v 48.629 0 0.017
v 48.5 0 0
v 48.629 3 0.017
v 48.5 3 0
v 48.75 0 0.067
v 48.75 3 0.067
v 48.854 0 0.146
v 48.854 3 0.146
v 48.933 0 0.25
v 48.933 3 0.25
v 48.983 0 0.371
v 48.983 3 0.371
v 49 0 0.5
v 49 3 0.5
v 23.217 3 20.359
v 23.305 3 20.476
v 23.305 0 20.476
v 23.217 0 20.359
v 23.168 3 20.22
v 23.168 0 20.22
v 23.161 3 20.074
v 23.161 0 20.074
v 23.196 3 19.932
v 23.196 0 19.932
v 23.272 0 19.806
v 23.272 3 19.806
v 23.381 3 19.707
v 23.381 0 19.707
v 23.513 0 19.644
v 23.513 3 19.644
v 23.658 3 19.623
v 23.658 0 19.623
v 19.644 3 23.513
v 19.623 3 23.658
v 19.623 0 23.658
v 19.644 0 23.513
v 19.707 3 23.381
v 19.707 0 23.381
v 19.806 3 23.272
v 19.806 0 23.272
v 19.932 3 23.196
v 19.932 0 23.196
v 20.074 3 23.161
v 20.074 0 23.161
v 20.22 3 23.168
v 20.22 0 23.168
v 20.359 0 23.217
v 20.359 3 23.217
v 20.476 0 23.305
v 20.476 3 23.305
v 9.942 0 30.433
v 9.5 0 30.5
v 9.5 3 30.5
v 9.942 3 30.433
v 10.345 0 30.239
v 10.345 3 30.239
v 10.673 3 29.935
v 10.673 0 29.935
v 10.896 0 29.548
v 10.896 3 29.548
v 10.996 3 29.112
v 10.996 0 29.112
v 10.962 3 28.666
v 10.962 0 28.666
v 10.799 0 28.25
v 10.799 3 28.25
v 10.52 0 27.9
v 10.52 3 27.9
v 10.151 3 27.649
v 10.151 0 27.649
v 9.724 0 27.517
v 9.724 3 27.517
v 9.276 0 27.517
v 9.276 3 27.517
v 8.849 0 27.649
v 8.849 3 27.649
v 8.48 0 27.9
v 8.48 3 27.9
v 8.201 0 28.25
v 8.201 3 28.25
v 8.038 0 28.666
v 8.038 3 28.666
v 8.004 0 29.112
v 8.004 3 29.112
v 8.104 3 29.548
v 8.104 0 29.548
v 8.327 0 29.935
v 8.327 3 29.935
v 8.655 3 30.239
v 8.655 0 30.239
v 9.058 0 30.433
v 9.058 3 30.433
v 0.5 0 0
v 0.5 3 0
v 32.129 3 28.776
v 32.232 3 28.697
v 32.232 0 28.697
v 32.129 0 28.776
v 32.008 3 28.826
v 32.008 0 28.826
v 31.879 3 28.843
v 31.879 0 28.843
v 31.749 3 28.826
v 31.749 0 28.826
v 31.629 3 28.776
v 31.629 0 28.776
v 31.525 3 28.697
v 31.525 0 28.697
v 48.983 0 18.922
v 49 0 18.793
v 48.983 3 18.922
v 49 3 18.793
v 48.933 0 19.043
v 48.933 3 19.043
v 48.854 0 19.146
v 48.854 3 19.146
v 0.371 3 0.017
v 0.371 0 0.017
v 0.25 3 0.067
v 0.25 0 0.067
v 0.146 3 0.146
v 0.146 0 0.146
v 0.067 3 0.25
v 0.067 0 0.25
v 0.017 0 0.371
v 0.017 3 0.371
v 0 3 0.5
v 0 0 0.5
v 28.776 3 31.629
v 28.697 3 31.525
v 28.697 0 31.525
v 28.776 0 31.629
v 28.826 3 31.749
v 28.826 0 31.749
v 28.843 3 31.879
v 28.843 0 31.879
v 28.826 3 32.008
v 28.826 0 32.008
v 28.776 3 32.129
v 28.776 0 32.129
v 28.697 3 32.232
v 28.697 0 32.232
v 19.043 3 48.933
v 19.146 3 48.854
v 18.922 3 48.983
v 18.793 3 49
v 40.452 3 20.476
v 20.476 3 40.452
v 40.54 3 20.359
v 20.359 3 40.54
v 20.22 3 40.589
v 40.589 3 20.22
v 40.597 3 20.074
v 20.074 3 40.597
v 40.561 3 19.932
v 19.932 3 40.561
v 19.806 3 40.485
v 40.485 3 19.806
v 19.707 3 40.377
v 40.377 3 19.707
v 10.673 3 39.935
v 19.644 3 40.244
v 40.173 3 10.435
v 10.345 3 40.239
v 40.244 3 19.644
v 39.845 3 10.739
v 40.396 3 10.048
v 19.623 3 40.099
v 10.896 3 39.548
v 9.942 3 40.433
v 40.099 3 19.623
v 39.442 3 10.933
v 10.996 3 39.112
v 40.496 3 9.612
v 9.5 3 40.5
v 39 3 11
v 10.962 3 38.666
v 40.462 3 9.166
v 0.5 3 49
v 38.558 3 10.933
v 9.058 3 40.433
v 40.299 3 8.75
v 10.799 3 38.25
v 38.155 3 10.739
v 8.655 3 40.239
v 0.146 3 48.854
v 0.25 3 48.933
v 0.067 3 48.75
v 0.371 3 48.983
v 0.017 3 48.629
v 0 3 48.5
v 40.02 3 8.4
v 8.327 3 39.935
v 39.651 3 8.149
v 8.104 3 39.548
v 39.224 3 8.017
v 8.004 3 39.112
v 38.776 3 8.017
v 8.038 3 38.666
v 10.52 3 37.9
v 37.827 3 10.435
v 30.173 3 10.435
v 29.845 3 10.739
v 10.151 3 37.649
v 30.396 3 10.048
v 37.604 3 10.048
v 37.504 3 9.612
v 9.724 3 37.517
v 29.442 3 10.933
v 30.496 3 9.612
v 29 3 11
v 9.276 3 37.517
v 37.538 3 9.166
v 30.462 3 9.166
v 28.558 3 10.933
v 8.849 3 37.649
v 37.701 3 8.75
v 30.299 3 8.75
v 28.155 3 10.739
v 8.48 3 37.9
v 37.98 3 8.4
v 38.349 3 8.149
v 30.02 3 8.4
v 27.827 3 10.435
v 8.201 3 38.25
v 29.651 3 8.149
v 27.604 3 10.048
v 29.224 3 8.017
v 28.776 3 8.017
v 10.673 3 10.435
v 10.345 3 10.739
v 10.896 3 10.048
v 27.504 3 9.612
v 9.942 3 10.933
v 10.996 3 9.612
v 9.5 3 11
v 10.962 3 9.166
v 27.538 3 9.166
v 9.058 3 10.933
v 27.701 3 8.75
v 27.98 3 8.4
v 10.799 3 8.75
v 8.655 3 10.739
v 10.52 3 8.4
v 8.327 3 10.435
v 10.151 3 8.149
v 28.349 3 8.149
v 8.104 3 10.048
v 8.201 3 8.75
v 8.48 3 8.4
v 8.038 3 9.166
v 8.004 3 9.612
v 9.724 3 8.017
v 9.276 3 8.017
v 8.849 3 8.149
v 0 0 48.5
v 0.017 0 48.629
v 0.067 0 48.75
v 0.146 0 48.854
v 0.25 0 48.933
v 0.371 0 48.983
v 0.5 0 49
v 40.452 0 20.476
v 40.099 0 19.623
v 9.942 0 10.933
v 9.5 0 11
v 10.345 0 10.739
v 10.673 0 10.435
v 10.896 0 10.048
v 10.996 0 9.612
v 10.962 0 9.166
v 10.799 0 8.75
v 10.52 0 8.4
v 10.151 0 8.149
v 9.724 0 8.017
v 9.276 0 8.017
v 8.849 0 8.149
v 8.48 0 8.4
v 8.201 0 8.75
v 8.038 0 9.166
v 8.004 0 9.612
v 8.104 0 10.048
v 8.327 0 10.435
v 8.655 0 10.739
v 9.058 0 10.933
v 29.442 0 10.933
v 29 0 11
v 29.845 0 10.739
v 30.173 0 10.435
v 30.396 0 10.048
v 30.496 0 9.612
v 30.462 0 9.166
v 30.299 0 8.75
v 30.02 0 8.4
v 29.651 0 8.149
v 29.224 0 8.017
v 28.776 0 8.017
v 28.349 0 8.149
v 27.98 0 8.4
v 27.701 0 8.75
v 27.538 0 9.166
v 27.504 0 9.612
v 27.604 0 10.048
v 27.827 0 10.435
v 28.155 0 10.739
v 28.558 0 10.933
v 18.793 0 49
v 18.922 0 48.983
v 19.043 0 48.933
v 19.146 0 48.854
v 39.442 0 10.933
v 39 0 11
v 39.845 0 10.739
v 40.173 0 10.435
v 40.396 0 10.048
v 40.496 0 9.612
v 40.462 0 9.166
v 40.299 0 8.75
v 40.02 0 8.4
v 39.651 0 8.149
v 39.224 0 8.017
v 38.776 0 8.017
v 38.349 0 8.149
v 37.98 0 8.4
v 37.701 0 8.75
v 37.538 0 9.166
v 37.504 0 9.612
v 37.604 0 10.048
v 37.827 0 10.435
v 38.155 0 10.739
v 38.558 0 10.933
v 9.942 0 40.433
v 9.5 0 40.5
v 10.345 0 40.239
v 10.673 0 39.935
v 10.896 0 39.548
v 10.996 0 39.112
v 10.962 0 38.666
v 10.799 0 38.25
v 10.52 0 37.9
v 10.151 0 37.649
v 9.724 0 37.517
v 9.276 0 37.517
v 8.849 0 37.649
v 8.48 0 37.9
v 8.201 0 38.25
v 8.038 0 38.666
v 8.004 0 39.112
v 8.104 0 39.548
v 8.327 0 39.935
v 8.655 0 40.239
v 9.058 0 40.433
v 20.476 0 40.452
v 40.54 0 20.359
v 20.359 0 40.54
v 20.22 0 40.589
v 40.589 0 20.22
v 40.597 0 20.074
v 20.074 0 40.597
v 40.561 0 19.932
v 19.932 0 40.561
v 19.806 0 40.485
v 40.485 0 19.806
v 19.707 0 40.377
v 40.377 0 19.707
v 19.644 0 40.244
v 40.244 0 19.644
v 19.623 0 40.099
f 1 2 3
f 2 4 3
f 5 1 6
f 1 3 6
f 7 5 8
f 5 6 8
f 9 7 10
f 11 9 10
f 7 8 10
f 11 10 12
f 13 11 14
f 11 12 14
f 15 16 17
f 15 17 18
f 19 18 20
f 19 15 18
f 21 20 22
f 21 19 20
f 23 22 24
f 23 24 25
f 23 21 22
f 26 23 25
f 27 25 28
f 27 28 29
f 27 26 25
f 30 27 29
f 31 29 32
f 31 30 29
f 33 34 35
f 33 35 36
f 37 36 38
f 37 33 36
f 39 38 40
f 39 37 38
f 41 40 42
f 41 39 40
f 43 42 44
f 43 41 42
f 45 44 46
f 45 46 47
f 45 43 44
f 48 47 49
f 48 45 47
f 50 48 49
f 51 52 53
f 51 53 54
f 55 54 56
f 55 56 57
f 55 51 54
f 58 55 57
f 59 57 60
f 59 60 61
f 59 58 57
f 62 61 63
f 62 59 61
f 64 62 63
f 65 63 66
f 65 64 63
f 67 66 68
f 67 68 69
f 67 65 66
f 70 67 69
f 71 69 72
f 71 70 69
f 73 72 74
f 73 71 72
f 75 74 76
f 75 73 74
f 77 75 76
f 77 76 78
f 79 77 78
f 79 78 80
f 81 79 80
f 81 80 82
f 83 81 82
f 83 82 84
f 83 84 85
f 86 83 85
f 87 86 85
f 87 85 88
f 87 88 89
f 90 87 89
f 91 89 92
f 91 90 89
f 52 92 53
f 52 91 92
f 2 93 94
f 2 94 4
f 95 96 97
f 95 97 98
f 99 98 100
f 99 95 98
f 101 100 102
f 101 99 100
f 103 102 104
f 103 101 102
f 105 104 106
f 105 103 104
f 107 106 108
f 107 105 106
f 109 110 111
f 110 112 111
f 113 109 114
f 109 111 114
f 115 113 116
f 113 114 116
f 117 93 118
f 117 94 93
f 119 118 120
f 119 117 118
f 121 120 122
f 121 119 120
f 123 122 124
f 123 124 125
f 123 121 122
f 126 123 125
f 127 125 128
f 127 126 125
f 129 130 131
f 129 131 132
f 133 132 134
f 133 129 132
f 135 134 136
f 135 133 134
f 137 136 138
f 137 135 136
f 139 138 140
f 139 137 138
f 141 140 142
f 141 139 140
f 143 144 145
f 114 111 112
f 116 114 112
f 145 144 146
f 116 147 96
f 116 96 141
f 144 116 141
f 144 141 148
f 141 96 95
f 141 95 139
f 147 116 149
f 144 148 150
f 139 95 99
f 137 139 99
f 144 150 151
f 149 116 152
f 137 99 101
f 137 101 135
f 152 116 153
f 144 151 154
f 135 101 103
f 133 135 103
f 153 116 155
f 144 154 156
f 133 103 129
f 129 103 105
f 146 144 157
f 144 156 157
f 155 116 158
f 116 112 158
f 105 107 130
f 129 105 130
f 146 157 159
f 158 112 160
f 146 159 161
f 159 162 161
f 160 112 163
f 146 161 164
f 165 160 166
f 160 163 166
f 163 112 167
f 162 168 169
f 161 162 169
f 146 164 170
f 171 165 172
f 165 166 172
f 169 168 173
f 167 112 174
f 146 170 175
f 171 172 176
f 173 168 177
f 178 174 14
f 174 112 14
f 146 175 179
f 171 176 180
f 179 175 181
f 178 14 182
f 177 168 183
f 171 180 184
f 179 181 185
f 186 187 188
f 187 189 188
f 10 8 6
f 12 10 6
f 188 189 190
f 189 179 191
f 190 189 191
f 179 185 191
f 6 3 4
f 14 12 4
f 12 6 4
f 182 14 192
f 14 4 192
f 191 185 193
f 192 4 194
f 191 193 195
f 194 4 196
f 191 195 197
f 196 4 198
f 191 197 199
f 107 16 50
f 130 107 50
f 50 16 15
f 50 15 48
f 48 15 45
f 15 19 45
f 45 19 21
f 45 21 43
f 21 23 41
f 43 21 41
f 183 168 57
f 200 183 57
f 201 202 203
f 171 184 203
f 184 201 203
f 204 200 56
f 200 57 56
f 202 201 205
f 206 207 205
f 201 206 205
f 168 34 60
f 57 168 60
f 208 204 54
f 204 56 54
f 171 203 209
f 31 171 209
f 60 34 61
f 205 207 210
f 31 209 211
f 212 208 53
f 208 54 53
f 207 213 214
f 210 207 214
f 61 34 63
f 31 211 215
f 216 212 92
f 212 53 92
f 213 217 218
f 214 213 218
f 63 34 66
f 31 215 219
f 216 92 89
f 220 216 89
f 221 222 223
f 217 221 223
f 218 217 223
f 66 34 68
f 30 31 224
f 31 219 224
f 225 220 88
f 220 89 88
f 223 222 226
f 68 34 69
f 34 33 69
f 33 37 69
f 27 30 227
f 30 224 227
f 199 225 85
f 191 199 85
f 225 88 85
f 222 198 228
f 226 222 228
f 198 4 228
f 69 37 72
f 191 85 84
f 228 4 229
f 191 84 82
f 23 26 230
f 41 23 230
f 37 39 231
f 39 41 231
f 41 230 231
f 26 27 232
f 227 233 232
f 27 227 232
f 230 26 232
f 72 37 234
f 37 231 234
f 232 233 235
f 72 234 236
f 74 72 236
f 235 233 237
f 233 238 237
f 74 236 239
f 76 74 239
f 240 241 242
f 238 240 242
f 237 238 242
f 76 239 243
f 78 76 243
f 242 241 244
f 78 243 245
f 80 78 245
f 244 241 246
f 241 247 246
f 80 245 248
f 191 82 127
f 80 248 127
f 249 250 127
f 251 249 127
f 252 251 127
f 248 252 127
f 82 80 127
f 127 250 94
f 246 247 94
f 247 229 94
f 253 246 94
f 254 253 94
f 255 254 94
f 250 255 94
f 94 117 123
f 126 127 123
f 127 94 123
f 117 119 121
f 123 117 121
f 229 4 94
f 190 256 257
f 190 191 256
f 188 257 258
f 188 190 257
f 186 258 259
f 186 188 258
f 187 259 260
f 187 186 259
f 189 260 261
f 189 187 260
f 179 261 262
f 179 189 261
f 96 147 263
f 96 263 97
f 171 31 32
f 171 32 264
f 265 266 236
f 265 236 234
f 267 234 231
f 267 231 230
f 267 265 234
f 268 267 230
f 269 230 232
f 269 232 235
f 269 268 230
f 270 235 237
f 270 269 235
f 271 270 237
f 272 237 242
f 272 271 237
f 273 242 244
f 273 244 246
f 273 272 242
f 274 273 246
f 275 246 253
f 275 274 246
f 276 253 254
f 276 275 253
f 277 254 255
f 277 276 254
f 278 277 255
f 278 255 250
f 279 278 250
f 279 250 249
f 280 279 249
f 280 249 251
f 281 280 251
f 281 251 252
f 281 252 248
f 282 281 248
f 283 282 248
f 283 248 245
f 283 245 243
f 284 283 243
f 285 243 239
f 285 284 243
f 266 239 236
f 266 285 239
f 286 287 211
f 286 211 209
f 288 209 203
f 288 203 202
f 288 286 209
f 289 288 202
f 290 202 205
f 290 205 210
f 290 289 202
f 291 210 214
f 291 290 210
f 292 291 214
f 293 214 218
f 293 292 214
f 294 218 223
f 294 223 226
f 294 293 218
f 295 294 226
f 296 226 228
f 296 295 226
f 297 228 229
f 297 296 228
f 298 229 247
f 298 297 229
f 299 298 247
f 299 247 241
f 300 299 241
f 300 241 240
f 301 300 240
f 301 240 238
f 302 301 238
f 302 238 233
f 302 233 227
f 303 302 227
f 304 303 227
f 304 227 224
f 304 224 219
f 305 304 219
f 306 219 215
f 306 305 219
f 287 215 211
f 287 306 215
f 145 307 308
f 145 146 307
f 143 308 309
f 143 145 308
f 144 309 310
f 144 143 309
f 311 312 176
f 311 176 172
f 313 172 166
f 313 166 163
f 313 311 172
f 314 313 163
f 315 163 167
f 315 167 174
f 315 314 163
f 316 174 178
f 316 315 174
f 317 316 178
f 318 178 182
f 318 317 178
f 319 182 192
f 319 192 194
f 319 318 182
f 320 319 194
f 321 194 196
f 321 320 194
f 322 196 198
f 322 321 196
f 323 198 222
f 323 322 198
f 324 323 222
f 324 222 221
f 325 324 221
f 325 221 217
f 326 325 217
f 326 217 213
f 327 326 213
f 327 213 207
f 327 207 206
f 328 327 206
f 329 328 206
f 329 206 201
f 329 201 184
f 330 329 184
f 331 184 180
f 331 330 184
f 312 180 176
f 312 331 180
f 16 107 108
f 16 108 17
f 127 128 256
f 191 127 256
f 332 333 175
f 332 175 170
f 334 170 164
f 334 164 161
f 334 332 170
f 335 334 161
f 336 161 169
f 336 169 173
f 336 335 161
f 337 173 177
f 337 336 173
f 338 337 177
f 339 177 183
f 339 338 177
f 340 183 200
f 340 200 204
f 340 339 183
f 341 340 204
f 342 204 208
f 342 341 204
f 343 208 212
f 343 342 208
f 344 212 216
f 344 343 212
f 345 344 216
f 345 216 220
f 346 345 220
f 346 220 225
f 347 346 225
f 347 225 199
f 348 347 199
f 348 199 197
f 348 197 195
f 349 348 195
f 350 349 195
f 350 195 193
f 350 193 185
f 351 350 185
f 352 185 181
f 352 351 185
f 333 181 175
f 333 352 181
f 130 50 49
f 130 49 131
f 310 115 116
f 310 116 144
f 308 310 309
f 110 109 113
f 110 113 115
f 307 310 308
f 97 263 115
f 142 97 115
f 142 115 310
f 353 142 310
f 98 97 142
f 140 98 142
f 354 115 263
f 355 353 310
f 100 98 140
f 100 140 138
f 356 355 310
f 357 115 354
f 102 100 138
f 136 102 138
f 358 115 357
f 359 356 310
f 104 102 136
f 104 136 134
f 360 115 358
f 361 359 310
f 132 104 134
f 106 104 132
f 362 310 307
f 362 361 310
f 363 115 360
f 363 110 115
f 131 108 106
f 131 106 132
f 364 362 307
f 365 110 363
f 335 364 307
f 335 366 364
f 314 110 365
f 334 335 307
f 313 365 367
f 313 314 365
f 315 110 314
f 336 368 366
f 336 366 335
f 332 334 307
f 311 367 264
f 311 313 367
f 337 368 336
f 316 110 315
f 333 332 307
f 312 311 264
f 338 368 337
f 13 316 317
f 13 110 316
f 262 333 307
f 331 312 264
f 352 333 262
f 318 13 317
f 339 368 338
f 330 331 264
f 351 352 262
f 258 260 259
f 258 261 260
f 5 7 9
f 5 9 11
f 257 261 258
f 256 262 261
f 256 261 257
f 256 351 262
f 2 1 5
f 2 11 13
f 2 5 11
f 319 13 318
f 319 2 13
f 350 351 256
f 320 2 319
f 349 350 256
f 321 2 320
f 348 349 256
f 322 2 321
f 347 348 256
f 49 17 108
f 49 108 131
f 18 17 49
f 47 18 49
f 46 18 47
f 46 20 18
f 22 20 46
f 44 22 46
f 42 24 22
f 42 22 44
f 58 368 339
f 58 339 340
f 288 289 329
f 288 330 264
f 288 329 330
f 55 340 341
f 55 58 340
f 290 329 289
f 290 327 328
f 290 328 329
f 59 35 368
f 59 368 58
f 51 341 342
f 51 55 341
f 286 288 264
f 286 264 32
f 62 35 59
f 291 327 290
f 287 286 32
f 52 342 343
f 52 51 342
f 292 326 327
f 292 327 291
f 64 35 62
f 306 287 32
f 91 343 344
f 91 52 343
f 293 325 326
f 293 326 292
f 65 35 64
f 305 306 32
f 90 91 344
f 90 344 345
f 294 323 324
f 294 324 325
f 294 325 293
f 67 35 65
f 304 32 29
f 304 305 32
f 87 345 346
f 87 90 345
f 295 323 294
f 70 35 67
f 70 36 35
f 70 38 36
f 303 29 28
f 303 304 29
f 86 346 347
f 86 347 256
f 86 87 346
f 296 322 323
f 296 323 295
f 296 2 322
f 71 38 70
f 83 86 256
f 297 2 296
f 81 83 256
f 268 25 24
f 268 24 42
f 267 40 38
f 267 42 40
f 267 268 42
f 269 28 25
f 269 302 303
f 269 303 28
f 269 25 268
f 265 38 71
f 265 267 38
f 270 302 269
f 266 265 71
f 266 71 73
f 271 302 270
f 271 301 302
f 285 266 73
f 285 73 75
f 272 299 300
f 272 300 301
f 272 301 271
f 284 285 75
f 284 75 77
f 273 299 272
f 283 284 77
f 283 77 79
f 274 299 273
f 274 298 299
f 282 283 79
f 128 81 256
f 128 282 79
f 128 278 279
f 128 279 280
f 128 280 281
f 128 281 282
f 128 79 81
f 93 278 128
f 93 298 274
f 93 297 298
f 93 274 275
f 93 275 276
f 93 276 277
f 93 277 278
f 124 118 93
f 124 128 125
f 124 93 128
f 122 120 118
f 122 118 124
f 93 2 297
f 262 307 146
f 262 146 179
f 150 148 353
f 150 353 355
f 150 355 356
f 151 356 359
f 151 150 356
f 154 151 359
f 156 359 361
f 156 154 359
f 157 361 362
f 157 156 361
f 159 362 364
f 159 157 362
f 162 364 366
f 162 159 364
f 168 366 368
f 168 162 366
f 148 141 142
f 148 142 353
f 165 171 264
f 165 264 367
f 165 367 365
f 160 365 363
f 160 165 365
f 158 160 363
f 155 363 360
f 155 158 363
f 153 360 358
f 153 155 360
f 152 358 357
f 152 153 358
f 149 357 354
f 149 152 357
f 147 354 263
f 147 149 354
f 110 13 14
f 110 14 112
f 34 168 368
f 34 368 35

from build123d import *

# Parameters (mm, degrees)
SKETCH1_R           = 1.5
BOSS_EXTRUDE1_DEPTH = 3
FILLET1_R           = 0.5
CUT_EXTRUDE1_DEPTH  = 3


with BuildPart() as part:
    # Sketch1 → Boss-Extrude1 (new body)
    with BuildSketch(Plane(origin=(0, 0, 0), x_dir=(1, 0, 0), z_dir=(0, 1, 0))):
        Polygon((0, 0), (49, 0), (49, -19), (19, -49), (0, -49), (0, -19), align=None)
        with Locations(Location((9.5, -9.5, 0), (0, 0, 270))):
            Circle(SKETCH1_R, mode=Mode.SUBTRACT)
        with Locations(Location((39, -9.5, 0), (0, 0, 270))):
            Circle(SKETCH1_R, mode=Mode.SUBTRACT)
        with Locations(Location((9.5, -39, 0), (0, 0, 270))):
            Circle(SKETCH1_R, mode=Mode.SUBTRACT)
        with Locations(Location((9.5, -29, 0), (0, 0, 270))):
            Circle(SKETCH1_R, mode=Mode.SUBTRACT)
        with Locations(Location((29, -9.5, 0), (0, 0, 270))):
            Circle(SKETCH1_R, mode=Mode.SUBTRACT)
    extrude(amount=BOSS_EXTRUDE1_DEPTH)

    # Fillet1
    fillet1_edges = [part.edges().sort_by_distance(p)[0] for p in [
        (0, 1.5, 0),
        (49, 1.5, 0),
        (49, 1.5, 19),
        (19, 1.5, 49),
        (0, 1.5, 49),
    ]]
    fillet(fillet1_edges, radius=FILLET1_R)

    # Sketch2 → Cut-Extrude1 (cut)
    with BuildSketch(Plane(origin=(0, 3, 0), x_dir=(1, 0, 0), z_dir=(0, 1, 0))):
        with BuildLine():
            Line((23.658427125, -19.622893219), (40.098932188, -19.622893219))
            ThreePointArc((40.098932188, -19.622893219), (40.560871954, -19.931551503), (40.452485579, -20.476446609))
            Line((40.452485579, -20.476446609), (32.232233047, -28.696699141))
            ThreePointArc((32.232233047, -28.696699141), (31.878679656, -28.843145751), (31.525126266, -28.696699141))
            Line((31.525126266, -28.696699141), (23.304873734, -20.476446609))
            ThreePointArc((23.304873734, -20.476446609), (23.196487358, -19.931551503), (23.658427125, -19.622893219))
        make_face()
        with BuildLine():
            Line((20.476446609, -23.304873734), (28.696699141, -31.525126266))
            ThreePointArc((28.696699141, -31.525126266), (28.843145751, -31.878679656), (28.696699141, -32.232233047))
            Line((28.696699141, -32.232233047), (20.476446609, -40.452485579))
            ThreePointArc((20.476446609, -40.452485579), (19.931551503, -40.560871954), (19.622893219, -40.098932188))
            Line((19.622893219, -40.098932188), (19.622893219, -23.658427125))
            ThreePointArc((19.622893219, -23.658427125), (19.931551503, -23.196487358), (20.476446609, -23.304873734))
        make_face()
    extrude(amount=-CUT_EXTRUDE1_DEPTH, mode=Mode.SUBTRACT)


solid = part.part
